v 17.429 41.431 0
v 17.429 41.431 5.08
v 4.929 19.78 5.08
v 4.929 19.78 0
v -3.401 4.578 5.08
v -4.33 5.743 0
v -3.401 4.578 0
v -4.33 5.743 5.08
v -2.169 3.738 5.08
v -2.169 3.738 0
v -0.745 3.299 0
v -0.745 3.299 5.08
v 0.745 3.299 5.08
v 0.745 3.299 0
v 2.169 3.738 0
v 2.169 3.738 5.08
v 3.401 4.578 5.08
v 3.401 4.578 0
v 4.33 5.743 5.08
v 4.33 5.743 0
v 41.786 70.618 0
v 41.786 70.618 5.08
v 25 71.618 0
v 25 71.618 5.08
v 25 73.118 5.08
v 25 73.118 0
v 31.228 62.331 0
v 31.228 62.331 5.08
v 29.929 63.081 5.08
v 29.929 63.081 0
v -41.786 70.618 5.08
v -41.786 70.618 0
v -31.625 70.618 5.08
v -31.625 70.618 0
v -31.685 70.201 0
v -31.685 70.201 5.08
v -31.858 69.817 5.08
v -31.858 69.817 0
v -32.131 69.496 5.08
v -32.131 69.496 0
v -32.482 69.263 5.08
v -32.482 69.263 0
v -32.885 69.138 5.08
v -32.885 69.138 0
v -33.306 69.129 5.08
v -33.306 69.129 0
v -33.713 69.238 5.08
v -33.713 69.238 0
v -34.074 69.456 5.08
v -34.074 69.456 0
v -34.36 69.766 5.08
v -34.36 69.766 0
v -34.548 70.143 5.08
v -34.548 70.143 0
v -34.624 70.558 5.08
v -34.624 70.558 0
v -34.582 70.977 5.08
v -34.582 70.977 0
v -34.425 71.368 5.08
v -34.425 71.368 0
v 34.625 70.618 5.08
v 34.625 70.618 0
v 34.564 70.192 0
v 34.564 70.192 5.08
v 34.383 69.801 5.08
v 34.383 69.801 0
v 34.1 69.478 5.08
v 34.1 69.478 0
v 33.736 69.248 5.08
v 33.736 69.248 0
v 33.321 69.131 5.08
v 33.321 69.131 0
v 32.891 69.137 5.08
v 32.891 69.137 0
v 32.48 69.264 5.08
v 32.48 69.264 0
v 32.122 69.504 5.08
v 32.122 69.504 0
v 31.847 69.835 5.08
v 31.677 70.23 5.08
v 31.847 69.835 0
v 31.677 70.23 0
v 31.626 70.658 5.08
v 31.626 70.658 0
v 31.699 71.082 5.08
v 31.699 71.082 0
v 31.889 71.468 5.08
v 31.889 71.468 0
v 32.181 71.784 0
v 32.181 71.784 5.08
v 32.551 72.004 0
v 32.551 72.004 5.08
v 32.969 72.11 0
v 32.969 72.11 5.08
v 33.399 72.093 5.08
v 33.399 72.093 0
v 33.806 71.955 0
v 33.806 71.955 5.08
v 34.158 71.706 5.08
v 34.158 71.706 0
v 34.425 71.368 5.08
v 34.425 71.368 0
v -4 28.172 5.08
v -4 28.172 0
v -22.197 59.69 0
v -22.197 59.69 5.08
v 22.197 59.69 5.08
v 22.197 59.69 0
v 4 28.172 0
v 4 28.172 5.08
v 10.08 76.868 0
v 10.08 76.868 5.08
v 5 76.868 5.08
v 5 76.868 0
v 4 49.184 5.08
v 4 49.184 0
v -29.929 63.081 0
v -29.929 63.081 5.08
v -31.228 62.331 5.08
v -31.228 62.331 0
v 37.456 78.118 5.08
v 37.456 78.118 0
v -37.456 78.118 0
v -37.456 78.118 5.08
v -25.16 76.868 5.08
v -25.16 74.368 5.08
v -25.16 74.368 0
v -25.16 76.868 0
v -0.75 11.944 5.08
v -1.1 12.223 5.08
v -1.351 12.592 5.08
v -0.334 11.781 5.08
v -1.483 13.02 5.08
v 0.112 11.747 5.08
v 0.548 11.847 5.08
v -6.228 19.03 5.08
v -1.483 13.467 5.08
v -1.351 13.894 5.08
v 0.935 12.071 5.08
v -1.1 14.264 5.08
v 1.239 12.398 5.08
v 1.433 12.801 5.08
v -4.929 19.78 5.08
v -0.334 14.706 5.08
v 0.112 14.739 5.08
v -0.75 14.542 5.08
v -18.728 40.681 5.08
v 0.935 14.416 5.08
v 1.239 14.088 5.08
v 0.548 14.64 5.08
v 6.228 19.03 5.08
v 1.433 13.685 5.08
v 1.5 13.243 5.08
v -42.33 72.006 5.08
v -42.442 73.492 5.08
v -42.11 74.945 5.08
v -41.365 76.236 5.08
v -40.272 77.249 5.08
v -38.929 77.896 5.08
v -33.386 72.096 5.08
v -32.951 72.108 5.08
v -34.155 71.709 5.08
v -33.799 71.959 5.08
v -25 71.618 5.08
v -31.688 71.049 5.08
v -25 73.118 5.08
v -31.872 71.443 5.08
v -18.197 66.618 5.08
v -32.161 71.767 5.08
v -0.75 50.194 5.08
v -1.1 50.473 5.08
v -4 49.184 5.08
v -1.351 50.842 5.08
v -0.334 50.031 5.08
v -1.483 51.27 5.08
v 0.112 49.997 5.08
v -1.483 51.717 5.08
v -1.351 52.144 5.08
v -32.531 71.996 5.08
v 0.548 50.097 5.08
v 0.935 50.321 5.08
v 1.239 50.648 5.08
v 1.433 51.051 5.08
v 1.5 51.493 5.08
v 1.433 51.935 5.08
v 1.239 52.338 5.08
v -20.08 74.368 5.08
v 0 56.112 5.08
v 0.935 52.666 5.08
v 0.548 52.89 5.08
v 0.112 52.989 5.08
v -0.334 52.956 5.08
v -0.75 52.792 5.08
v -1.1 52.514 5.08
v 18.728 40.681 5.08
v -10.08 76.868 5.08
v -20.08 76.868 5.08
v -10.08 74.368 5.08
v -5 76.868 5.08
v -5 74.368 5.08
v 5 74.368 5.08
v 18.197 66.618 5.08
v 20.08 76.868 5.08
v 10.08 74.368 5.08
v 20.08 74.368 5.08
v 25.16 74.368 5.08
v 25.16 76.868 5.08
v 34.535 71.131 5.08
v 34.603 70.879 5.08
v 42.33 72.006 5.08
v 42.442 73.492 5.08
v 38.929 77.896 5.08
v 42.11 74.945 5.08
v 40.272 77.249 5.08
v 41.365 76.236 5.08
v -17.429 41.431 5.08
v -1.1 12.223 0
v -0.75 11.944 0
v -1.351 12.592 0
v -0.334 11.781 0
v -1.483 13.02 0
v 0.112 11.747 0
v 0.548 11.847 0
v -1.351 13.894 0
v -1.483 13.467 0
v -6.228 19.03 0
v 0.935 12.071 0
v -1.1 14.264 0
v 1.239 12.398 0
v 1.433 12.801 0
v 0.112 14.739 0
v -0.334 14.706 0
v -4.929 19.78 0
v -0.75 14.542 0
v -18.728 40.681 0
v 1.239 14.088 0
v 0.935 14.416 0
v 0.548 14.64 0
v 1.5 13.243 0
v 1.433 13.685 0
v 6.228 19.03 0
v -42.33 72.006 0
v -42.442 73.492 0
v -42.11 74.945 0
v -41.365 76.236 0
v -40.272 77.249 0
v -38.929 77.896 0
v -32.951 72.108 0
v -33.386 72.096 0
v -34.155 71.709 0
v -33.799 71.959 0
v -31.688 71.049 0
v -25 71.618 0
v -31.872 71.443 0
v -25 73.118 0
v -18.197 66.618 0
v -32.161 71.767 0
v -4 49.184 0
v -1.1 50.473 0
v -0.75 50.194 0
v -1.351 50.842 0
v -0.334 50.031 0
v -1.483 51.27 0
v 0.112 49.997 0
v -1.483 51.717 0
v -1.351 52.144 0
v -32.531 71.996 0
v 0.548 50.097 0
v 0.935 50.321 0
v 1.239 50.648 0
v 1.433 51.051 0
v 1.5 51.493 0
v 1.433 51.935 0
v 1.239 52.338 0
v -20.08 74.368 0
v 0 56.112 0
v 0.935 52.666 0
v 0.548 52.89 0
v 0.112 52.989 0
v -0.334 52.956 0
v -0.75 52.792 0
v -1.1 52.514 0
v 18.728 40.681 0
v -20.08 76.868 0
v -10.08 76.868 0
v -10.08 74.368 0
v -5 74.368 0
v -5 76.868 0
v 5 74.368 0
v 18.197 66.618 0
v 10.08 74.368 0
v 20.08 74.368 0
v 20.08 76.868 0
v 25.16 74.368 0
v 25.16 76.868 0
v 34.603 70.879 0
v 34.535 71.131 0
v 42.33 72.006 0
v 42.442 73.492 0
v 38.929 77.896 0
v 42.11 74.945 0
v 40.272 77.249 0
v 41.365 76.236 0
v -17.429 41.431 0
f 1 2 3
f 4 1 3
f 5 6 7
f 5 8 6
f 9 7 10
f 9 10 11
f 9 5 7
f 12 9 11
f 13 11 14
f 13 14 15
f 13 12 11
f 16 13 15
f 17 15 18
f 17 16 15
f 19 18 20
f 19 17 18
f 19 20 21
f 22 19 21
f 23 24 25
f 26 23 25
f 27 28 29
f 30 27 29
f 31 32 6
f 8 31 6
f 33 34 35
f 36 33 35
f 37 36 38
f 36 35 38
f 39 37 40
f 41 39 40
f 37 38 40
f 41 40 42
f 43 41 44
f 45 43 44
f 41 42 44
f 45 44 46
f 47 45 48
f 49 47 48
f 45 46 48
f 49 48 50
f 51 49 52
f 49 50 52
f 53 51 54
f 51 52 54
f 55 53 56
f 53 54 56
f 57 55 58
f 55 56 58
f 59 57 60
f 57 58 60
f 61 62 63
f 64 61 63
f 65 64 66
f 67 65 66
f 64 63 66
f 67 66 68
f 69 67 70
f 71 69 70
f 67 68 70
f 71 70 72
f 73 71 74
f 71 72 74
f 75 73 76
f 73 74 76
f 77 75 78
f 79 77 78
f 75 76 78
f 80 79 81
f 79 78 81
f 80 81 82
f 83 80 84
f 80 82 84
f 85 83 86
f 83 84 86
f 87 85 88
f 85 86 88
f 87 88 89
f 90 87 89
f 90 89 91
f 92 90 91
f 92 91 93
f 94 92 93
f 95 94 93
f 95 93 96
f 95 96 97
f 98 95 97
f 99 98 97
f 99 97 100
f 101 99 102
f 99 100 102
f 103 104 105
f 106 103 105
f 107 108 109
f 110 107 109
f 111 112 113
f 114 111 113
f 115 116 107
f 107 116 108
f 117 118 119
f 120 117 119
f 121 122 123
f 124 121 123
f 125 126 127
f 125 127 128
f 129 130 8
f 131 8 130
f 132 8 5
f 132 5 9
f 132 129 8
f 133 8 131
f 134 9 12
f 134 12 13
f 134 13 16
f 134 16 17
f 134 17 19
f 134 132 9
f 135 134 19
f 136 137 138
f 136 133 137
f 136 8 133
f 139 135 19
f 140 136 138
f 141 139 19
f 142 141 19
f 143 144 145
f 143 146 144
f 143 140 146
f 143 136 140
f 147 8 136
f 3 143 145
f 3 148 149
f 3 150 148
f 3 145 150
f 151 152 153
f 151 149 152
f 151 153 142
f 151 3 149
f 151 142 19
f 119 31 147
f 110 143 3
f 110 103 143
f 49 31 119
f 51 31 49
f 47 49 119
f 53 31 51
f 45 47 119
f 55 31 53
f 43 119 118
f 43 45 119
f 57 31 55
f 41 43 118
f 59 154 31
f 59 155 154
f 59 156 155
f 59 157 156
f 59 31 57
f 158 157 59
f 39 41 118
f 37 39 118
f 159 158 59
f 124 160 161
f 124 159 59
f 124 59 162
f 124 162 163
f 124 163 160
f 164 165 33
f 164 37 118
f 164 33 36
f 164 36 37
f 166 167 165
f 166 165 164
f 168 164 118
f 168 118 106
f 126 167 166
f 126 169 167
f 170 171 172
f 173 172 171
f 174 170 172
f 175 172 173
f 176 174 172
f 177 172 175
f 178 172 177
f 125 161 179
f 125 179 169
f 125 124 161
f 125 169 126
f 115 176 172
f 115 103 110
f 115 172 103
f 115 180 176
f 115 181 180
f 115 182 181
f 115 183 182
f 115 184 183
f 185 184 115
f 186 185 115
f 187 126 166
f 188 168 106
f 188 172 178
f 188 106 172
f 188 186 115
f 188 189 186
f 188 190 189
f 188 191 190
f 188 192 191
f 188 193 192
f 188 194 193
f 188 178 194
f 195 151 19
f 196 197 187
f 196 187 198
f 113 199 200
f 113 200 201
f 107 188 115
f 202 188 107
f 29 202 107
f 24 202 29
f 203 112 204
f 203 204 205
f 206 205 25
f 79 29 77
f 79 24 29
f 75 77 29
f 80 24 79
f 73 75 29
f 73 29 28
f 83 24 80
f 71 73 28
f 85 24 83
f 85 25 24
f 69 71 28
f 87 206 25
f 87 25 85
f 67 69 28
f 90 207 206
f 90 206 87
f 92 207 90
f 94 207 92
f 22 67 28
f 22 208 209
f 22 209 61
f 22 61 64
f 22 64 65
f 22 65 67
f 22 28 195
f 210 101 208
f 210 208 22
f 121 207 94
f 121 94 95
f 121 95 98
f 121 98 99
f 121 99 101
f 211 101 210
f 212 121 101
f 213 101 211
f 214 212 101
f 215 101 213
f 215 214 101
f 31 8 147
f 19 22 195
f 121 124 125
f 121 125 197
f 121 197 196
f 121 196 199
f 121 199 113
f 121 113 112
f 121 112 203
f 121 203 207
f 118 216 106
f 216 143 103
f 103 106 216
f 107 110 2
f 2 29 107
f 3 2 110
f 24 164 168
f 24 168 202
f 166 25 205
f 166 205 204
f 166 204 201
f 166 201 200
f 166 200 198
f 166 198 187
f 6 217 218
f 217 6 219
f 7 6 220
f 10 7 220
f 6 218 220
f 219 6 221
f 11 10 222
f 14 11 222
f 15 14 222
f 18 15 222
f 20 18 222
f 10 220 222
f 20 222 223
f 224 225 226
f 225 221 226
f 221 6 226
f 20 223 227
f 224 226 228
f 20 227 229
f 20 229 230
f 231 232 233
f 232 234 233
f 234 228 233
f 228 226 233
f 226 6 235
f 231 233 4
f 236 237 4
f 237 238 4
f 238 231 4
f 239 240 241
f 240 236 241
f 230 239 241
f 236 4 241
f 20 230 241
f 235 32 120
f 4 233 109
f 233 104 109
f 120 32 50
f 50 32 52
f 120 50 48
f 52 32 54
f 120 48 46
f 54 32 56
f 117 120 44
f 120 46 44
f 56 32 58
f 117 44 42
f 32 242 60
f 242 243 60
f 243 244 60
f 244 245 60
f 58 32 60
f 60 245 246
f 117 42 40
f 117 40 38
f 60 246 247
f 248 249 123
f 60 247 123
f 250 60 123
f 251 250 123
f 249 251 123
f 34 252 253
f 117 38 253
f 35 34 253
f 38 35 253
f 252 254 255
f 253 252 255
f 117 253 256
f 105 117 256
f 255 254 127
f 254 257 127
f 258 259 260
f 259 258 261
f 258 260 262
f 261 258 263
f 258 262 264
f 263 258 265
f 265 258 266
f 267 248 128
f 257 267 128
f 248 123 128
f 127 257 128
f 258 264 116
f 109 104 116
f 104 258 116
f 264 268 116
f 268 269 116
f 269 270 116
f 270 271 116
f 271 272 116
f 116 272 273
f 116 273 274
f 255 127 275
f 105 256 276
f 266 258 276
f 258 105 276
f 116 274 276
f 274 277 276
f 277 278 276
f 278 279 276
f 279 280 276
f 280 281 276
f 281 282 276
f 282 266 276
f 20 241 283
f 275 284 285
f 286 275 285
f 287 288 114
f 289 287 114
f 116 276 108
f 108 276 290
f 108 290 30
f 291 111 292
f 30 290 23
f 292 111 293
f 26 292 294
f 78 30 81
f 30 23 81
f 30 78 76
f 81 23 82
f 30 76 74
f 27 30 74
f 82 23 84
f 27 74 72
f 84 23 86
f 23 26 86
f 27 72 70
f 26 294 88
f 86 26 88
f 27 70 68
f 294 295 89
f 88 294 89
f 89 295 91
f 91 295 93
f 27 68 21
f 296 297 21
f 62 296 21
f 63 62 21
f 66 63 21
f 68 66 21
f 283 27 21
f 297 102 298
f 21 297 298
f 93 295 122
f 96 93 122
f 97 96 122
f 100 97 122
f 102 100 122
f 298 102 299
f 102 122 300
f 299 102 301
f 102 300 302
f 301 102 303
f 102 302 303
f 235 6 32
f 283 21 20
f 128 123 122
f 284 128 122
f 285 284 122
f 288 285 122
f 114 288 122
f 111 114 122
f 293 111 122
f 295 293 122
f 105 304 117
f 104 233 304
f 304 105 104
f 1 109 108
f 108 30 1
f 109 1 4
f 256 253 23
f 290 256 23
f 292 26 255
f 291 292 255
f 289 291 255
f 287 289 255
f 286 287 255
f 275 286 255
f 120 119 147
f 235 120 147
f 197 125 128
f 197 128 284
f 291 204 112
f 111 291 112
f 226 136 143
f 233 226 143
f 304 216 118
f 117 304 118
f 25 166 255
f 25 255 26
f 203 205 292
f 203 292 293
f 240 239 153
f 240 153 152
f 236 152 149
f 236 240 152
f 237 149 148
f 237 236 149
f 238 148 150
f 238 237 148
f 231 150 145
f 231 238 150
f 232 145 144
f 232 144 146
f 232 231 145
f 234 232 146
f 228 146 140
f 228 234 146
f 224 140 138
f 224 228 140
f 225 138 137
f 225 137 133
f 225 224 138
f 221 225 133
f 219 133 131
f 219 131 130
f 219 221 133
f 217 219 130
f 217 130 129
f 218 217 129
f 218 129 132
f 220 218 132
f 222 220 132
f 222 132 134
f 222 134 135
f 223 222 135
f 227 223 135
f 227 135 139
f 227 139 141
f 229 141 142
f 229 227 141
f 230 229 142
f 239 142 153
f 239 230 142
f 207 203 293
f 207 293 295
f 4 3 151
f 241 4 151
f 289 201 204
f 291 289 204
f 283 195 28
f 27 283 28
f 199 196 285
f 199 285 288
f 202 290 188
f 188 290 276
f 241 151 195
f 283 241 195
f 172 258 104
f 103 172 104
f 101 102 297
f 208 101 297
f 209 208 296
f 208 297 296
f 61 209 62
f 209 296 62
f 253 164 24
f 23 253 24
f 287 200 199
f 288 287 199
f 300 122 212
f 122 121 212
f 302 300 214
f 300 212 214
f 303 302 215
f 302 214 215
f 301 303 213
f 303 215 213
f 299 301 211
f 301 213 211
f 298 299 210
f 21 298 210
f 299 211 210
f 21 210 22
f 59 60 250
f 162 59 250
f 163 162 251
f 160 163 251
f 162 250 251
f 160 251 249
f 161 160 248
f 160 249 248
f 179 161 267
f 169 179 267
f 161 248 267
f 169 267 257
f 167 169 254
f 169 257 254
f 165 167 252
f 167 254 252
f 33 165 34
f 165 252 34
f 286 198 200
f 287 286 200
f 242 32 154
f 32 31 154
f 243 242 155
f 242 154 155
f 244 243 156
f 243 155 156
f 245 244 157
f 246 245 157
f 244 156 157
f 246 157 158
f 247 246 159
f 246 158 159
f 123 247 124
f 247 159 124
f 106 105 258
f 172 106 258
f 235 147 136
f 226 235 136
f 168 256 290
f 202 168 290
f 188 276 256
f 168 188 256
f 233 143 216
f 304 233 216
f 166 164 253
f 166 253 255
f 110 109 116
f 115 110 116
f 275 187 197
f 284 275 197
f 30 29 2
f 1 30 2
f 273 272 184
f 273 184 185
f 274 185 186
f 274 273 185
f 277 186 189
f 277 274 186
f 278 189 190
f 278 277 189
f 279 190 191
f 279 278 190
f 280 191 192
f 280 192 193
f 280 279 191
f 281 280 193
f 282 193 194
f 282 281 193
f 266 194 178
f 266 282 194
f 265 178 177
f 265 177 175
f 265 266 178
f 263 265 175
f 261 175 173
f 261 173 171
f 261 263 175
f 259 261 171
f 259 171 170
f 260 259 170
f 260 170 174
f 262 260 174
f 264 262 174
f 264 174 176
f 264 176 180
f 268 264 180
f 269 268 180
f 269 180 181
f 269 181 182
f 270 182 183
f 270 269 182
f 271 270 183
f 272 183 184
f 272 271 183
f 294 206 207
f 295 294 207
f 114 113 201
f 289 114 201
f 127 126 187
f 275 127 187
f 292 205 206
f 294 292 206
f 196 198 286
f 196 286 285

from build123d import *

# Parameters (mm, degrees)
F0_R     = 1.5
F1_DEPTH = 5.08
F2_R     = 5
F3_W     = 50
F3_H     = 1.5
F3_W_2   = 5.08
F3_H_2   = 2.5
F4_DEPTH = 25


with BuildPart() as f1:
    # F0 (on Top) → F1 (new body)
    with BuildSketch(Plane.XY):
        Polygon((0, 78.118305), (-46.115853, 78.118305), (0, -1.756695), (46.115853, 78.118305), align=None)
        with Locations((0, 13.243305)):
            Circle(F0_R, mode=Mode.SUBTRACT)
        Polygon((-18.197268, 66.618305), (0, 66.618305), (18.197268, 66.618305), (26.197268, 66.618305), (22.197268, 59.690101), (4, 28.171508), (0, 21.243305), (-4, 28.171508), (-22.197268, 59.690101), (-26.197268, 66.618305), align=None, mode=Mode.SUBTRACT)
        with BuildLine():
            ThreePointArc((-34.42451, 71.368305), (-32.737243, 72.067193), (-31.625472, 70.618305))
            ThreePointArc((-31.625472, 70.618305), (-33.5137, 69.169416), (-34.42451, 71.368305))
        make_face(mode=Mode.SUBTRACT)
        with BuildLine():
            ThreePointArc((34.625472, 70.618305), (31.676583, 70.230076), (34.42451, 71.368305))
            ThreePointArc((34.42451, 71.368305), (34.57436, 71.006533), (34.625472, 70.618305))
        make_face(mode=Mode.SUBTRACT)
        Polygon((26.197268, 66.618305), (18.197268, 66.618305), (0, 56.112107), (-18.197268, 66.618305), (-26.197268, 66.618305), (-22.197268, 59.690101), (-4, 49.183903), (-4, 28.171508), (0, 21.243305), (4, 28.171508), (4, 49.183903), (22.197268, 59.690101), align=None)
        with Locations((0, 51.493305)):
            Circle(F0_R, mode=Mode.SUBTRACT)
    extrude(amount=F1_DEPTH)

    # F2
    f2_edges = [f1.edges().sort_by_distance(p)[0] for p in [
        (-46.115853, 78.118305, 2.54),
        (0, -1.756695, 2.54),
        (46.115853, 78.118305, 2.54),
    ]]
    fillet(f2_edges, radius=F2_R)

    # F3 (on face) → F4 (cut)
    with BuildSketch(Plane.XY.offset(5.08)):
        with Locations((0, 72.368305)):
            Rectangle(F3_W, F3_H)
        Polygon((-6.227799, 19.030169), (-5.57828, 19.405169), (-4.928761, 19.780169), (-17.428761, 41.430805), (-29.928761, 63.08144), (-30.57828, 62.70644), (-31.227799, 62.33144), (-18.727799, 40.680805), align=None)
        Polygon((30.57828, 62.70644), (29.928761, 63.08144), (17.428761, 41.430805), (4.928761, 19.780169), (5.57828, 19.405169), (6.227799, 19.030169), (18.727799, 40.680805), (31.227799, 62.33144), align=None)
        Polygon((10.08, 76.868305), (5, 76.868305), (5, 75.618305), (5, 74.368305), (10.08, 74.368305), align=None)
        with Locations((22.62, 75.618305)):
            Rectangle(F3_W_2, F3_H_2)
        with Locations((-22.62, 75.618305)):
            Rectangle(F3_W_2, F3_H_2)
        with Locations((-7.54, 75.618305)):
            Rectangle(F3_W_2, F3_H_2)
    extrude(amount=-F4_DEPTH, mode=Mode.SUBTRACT)


solid = f1.part
